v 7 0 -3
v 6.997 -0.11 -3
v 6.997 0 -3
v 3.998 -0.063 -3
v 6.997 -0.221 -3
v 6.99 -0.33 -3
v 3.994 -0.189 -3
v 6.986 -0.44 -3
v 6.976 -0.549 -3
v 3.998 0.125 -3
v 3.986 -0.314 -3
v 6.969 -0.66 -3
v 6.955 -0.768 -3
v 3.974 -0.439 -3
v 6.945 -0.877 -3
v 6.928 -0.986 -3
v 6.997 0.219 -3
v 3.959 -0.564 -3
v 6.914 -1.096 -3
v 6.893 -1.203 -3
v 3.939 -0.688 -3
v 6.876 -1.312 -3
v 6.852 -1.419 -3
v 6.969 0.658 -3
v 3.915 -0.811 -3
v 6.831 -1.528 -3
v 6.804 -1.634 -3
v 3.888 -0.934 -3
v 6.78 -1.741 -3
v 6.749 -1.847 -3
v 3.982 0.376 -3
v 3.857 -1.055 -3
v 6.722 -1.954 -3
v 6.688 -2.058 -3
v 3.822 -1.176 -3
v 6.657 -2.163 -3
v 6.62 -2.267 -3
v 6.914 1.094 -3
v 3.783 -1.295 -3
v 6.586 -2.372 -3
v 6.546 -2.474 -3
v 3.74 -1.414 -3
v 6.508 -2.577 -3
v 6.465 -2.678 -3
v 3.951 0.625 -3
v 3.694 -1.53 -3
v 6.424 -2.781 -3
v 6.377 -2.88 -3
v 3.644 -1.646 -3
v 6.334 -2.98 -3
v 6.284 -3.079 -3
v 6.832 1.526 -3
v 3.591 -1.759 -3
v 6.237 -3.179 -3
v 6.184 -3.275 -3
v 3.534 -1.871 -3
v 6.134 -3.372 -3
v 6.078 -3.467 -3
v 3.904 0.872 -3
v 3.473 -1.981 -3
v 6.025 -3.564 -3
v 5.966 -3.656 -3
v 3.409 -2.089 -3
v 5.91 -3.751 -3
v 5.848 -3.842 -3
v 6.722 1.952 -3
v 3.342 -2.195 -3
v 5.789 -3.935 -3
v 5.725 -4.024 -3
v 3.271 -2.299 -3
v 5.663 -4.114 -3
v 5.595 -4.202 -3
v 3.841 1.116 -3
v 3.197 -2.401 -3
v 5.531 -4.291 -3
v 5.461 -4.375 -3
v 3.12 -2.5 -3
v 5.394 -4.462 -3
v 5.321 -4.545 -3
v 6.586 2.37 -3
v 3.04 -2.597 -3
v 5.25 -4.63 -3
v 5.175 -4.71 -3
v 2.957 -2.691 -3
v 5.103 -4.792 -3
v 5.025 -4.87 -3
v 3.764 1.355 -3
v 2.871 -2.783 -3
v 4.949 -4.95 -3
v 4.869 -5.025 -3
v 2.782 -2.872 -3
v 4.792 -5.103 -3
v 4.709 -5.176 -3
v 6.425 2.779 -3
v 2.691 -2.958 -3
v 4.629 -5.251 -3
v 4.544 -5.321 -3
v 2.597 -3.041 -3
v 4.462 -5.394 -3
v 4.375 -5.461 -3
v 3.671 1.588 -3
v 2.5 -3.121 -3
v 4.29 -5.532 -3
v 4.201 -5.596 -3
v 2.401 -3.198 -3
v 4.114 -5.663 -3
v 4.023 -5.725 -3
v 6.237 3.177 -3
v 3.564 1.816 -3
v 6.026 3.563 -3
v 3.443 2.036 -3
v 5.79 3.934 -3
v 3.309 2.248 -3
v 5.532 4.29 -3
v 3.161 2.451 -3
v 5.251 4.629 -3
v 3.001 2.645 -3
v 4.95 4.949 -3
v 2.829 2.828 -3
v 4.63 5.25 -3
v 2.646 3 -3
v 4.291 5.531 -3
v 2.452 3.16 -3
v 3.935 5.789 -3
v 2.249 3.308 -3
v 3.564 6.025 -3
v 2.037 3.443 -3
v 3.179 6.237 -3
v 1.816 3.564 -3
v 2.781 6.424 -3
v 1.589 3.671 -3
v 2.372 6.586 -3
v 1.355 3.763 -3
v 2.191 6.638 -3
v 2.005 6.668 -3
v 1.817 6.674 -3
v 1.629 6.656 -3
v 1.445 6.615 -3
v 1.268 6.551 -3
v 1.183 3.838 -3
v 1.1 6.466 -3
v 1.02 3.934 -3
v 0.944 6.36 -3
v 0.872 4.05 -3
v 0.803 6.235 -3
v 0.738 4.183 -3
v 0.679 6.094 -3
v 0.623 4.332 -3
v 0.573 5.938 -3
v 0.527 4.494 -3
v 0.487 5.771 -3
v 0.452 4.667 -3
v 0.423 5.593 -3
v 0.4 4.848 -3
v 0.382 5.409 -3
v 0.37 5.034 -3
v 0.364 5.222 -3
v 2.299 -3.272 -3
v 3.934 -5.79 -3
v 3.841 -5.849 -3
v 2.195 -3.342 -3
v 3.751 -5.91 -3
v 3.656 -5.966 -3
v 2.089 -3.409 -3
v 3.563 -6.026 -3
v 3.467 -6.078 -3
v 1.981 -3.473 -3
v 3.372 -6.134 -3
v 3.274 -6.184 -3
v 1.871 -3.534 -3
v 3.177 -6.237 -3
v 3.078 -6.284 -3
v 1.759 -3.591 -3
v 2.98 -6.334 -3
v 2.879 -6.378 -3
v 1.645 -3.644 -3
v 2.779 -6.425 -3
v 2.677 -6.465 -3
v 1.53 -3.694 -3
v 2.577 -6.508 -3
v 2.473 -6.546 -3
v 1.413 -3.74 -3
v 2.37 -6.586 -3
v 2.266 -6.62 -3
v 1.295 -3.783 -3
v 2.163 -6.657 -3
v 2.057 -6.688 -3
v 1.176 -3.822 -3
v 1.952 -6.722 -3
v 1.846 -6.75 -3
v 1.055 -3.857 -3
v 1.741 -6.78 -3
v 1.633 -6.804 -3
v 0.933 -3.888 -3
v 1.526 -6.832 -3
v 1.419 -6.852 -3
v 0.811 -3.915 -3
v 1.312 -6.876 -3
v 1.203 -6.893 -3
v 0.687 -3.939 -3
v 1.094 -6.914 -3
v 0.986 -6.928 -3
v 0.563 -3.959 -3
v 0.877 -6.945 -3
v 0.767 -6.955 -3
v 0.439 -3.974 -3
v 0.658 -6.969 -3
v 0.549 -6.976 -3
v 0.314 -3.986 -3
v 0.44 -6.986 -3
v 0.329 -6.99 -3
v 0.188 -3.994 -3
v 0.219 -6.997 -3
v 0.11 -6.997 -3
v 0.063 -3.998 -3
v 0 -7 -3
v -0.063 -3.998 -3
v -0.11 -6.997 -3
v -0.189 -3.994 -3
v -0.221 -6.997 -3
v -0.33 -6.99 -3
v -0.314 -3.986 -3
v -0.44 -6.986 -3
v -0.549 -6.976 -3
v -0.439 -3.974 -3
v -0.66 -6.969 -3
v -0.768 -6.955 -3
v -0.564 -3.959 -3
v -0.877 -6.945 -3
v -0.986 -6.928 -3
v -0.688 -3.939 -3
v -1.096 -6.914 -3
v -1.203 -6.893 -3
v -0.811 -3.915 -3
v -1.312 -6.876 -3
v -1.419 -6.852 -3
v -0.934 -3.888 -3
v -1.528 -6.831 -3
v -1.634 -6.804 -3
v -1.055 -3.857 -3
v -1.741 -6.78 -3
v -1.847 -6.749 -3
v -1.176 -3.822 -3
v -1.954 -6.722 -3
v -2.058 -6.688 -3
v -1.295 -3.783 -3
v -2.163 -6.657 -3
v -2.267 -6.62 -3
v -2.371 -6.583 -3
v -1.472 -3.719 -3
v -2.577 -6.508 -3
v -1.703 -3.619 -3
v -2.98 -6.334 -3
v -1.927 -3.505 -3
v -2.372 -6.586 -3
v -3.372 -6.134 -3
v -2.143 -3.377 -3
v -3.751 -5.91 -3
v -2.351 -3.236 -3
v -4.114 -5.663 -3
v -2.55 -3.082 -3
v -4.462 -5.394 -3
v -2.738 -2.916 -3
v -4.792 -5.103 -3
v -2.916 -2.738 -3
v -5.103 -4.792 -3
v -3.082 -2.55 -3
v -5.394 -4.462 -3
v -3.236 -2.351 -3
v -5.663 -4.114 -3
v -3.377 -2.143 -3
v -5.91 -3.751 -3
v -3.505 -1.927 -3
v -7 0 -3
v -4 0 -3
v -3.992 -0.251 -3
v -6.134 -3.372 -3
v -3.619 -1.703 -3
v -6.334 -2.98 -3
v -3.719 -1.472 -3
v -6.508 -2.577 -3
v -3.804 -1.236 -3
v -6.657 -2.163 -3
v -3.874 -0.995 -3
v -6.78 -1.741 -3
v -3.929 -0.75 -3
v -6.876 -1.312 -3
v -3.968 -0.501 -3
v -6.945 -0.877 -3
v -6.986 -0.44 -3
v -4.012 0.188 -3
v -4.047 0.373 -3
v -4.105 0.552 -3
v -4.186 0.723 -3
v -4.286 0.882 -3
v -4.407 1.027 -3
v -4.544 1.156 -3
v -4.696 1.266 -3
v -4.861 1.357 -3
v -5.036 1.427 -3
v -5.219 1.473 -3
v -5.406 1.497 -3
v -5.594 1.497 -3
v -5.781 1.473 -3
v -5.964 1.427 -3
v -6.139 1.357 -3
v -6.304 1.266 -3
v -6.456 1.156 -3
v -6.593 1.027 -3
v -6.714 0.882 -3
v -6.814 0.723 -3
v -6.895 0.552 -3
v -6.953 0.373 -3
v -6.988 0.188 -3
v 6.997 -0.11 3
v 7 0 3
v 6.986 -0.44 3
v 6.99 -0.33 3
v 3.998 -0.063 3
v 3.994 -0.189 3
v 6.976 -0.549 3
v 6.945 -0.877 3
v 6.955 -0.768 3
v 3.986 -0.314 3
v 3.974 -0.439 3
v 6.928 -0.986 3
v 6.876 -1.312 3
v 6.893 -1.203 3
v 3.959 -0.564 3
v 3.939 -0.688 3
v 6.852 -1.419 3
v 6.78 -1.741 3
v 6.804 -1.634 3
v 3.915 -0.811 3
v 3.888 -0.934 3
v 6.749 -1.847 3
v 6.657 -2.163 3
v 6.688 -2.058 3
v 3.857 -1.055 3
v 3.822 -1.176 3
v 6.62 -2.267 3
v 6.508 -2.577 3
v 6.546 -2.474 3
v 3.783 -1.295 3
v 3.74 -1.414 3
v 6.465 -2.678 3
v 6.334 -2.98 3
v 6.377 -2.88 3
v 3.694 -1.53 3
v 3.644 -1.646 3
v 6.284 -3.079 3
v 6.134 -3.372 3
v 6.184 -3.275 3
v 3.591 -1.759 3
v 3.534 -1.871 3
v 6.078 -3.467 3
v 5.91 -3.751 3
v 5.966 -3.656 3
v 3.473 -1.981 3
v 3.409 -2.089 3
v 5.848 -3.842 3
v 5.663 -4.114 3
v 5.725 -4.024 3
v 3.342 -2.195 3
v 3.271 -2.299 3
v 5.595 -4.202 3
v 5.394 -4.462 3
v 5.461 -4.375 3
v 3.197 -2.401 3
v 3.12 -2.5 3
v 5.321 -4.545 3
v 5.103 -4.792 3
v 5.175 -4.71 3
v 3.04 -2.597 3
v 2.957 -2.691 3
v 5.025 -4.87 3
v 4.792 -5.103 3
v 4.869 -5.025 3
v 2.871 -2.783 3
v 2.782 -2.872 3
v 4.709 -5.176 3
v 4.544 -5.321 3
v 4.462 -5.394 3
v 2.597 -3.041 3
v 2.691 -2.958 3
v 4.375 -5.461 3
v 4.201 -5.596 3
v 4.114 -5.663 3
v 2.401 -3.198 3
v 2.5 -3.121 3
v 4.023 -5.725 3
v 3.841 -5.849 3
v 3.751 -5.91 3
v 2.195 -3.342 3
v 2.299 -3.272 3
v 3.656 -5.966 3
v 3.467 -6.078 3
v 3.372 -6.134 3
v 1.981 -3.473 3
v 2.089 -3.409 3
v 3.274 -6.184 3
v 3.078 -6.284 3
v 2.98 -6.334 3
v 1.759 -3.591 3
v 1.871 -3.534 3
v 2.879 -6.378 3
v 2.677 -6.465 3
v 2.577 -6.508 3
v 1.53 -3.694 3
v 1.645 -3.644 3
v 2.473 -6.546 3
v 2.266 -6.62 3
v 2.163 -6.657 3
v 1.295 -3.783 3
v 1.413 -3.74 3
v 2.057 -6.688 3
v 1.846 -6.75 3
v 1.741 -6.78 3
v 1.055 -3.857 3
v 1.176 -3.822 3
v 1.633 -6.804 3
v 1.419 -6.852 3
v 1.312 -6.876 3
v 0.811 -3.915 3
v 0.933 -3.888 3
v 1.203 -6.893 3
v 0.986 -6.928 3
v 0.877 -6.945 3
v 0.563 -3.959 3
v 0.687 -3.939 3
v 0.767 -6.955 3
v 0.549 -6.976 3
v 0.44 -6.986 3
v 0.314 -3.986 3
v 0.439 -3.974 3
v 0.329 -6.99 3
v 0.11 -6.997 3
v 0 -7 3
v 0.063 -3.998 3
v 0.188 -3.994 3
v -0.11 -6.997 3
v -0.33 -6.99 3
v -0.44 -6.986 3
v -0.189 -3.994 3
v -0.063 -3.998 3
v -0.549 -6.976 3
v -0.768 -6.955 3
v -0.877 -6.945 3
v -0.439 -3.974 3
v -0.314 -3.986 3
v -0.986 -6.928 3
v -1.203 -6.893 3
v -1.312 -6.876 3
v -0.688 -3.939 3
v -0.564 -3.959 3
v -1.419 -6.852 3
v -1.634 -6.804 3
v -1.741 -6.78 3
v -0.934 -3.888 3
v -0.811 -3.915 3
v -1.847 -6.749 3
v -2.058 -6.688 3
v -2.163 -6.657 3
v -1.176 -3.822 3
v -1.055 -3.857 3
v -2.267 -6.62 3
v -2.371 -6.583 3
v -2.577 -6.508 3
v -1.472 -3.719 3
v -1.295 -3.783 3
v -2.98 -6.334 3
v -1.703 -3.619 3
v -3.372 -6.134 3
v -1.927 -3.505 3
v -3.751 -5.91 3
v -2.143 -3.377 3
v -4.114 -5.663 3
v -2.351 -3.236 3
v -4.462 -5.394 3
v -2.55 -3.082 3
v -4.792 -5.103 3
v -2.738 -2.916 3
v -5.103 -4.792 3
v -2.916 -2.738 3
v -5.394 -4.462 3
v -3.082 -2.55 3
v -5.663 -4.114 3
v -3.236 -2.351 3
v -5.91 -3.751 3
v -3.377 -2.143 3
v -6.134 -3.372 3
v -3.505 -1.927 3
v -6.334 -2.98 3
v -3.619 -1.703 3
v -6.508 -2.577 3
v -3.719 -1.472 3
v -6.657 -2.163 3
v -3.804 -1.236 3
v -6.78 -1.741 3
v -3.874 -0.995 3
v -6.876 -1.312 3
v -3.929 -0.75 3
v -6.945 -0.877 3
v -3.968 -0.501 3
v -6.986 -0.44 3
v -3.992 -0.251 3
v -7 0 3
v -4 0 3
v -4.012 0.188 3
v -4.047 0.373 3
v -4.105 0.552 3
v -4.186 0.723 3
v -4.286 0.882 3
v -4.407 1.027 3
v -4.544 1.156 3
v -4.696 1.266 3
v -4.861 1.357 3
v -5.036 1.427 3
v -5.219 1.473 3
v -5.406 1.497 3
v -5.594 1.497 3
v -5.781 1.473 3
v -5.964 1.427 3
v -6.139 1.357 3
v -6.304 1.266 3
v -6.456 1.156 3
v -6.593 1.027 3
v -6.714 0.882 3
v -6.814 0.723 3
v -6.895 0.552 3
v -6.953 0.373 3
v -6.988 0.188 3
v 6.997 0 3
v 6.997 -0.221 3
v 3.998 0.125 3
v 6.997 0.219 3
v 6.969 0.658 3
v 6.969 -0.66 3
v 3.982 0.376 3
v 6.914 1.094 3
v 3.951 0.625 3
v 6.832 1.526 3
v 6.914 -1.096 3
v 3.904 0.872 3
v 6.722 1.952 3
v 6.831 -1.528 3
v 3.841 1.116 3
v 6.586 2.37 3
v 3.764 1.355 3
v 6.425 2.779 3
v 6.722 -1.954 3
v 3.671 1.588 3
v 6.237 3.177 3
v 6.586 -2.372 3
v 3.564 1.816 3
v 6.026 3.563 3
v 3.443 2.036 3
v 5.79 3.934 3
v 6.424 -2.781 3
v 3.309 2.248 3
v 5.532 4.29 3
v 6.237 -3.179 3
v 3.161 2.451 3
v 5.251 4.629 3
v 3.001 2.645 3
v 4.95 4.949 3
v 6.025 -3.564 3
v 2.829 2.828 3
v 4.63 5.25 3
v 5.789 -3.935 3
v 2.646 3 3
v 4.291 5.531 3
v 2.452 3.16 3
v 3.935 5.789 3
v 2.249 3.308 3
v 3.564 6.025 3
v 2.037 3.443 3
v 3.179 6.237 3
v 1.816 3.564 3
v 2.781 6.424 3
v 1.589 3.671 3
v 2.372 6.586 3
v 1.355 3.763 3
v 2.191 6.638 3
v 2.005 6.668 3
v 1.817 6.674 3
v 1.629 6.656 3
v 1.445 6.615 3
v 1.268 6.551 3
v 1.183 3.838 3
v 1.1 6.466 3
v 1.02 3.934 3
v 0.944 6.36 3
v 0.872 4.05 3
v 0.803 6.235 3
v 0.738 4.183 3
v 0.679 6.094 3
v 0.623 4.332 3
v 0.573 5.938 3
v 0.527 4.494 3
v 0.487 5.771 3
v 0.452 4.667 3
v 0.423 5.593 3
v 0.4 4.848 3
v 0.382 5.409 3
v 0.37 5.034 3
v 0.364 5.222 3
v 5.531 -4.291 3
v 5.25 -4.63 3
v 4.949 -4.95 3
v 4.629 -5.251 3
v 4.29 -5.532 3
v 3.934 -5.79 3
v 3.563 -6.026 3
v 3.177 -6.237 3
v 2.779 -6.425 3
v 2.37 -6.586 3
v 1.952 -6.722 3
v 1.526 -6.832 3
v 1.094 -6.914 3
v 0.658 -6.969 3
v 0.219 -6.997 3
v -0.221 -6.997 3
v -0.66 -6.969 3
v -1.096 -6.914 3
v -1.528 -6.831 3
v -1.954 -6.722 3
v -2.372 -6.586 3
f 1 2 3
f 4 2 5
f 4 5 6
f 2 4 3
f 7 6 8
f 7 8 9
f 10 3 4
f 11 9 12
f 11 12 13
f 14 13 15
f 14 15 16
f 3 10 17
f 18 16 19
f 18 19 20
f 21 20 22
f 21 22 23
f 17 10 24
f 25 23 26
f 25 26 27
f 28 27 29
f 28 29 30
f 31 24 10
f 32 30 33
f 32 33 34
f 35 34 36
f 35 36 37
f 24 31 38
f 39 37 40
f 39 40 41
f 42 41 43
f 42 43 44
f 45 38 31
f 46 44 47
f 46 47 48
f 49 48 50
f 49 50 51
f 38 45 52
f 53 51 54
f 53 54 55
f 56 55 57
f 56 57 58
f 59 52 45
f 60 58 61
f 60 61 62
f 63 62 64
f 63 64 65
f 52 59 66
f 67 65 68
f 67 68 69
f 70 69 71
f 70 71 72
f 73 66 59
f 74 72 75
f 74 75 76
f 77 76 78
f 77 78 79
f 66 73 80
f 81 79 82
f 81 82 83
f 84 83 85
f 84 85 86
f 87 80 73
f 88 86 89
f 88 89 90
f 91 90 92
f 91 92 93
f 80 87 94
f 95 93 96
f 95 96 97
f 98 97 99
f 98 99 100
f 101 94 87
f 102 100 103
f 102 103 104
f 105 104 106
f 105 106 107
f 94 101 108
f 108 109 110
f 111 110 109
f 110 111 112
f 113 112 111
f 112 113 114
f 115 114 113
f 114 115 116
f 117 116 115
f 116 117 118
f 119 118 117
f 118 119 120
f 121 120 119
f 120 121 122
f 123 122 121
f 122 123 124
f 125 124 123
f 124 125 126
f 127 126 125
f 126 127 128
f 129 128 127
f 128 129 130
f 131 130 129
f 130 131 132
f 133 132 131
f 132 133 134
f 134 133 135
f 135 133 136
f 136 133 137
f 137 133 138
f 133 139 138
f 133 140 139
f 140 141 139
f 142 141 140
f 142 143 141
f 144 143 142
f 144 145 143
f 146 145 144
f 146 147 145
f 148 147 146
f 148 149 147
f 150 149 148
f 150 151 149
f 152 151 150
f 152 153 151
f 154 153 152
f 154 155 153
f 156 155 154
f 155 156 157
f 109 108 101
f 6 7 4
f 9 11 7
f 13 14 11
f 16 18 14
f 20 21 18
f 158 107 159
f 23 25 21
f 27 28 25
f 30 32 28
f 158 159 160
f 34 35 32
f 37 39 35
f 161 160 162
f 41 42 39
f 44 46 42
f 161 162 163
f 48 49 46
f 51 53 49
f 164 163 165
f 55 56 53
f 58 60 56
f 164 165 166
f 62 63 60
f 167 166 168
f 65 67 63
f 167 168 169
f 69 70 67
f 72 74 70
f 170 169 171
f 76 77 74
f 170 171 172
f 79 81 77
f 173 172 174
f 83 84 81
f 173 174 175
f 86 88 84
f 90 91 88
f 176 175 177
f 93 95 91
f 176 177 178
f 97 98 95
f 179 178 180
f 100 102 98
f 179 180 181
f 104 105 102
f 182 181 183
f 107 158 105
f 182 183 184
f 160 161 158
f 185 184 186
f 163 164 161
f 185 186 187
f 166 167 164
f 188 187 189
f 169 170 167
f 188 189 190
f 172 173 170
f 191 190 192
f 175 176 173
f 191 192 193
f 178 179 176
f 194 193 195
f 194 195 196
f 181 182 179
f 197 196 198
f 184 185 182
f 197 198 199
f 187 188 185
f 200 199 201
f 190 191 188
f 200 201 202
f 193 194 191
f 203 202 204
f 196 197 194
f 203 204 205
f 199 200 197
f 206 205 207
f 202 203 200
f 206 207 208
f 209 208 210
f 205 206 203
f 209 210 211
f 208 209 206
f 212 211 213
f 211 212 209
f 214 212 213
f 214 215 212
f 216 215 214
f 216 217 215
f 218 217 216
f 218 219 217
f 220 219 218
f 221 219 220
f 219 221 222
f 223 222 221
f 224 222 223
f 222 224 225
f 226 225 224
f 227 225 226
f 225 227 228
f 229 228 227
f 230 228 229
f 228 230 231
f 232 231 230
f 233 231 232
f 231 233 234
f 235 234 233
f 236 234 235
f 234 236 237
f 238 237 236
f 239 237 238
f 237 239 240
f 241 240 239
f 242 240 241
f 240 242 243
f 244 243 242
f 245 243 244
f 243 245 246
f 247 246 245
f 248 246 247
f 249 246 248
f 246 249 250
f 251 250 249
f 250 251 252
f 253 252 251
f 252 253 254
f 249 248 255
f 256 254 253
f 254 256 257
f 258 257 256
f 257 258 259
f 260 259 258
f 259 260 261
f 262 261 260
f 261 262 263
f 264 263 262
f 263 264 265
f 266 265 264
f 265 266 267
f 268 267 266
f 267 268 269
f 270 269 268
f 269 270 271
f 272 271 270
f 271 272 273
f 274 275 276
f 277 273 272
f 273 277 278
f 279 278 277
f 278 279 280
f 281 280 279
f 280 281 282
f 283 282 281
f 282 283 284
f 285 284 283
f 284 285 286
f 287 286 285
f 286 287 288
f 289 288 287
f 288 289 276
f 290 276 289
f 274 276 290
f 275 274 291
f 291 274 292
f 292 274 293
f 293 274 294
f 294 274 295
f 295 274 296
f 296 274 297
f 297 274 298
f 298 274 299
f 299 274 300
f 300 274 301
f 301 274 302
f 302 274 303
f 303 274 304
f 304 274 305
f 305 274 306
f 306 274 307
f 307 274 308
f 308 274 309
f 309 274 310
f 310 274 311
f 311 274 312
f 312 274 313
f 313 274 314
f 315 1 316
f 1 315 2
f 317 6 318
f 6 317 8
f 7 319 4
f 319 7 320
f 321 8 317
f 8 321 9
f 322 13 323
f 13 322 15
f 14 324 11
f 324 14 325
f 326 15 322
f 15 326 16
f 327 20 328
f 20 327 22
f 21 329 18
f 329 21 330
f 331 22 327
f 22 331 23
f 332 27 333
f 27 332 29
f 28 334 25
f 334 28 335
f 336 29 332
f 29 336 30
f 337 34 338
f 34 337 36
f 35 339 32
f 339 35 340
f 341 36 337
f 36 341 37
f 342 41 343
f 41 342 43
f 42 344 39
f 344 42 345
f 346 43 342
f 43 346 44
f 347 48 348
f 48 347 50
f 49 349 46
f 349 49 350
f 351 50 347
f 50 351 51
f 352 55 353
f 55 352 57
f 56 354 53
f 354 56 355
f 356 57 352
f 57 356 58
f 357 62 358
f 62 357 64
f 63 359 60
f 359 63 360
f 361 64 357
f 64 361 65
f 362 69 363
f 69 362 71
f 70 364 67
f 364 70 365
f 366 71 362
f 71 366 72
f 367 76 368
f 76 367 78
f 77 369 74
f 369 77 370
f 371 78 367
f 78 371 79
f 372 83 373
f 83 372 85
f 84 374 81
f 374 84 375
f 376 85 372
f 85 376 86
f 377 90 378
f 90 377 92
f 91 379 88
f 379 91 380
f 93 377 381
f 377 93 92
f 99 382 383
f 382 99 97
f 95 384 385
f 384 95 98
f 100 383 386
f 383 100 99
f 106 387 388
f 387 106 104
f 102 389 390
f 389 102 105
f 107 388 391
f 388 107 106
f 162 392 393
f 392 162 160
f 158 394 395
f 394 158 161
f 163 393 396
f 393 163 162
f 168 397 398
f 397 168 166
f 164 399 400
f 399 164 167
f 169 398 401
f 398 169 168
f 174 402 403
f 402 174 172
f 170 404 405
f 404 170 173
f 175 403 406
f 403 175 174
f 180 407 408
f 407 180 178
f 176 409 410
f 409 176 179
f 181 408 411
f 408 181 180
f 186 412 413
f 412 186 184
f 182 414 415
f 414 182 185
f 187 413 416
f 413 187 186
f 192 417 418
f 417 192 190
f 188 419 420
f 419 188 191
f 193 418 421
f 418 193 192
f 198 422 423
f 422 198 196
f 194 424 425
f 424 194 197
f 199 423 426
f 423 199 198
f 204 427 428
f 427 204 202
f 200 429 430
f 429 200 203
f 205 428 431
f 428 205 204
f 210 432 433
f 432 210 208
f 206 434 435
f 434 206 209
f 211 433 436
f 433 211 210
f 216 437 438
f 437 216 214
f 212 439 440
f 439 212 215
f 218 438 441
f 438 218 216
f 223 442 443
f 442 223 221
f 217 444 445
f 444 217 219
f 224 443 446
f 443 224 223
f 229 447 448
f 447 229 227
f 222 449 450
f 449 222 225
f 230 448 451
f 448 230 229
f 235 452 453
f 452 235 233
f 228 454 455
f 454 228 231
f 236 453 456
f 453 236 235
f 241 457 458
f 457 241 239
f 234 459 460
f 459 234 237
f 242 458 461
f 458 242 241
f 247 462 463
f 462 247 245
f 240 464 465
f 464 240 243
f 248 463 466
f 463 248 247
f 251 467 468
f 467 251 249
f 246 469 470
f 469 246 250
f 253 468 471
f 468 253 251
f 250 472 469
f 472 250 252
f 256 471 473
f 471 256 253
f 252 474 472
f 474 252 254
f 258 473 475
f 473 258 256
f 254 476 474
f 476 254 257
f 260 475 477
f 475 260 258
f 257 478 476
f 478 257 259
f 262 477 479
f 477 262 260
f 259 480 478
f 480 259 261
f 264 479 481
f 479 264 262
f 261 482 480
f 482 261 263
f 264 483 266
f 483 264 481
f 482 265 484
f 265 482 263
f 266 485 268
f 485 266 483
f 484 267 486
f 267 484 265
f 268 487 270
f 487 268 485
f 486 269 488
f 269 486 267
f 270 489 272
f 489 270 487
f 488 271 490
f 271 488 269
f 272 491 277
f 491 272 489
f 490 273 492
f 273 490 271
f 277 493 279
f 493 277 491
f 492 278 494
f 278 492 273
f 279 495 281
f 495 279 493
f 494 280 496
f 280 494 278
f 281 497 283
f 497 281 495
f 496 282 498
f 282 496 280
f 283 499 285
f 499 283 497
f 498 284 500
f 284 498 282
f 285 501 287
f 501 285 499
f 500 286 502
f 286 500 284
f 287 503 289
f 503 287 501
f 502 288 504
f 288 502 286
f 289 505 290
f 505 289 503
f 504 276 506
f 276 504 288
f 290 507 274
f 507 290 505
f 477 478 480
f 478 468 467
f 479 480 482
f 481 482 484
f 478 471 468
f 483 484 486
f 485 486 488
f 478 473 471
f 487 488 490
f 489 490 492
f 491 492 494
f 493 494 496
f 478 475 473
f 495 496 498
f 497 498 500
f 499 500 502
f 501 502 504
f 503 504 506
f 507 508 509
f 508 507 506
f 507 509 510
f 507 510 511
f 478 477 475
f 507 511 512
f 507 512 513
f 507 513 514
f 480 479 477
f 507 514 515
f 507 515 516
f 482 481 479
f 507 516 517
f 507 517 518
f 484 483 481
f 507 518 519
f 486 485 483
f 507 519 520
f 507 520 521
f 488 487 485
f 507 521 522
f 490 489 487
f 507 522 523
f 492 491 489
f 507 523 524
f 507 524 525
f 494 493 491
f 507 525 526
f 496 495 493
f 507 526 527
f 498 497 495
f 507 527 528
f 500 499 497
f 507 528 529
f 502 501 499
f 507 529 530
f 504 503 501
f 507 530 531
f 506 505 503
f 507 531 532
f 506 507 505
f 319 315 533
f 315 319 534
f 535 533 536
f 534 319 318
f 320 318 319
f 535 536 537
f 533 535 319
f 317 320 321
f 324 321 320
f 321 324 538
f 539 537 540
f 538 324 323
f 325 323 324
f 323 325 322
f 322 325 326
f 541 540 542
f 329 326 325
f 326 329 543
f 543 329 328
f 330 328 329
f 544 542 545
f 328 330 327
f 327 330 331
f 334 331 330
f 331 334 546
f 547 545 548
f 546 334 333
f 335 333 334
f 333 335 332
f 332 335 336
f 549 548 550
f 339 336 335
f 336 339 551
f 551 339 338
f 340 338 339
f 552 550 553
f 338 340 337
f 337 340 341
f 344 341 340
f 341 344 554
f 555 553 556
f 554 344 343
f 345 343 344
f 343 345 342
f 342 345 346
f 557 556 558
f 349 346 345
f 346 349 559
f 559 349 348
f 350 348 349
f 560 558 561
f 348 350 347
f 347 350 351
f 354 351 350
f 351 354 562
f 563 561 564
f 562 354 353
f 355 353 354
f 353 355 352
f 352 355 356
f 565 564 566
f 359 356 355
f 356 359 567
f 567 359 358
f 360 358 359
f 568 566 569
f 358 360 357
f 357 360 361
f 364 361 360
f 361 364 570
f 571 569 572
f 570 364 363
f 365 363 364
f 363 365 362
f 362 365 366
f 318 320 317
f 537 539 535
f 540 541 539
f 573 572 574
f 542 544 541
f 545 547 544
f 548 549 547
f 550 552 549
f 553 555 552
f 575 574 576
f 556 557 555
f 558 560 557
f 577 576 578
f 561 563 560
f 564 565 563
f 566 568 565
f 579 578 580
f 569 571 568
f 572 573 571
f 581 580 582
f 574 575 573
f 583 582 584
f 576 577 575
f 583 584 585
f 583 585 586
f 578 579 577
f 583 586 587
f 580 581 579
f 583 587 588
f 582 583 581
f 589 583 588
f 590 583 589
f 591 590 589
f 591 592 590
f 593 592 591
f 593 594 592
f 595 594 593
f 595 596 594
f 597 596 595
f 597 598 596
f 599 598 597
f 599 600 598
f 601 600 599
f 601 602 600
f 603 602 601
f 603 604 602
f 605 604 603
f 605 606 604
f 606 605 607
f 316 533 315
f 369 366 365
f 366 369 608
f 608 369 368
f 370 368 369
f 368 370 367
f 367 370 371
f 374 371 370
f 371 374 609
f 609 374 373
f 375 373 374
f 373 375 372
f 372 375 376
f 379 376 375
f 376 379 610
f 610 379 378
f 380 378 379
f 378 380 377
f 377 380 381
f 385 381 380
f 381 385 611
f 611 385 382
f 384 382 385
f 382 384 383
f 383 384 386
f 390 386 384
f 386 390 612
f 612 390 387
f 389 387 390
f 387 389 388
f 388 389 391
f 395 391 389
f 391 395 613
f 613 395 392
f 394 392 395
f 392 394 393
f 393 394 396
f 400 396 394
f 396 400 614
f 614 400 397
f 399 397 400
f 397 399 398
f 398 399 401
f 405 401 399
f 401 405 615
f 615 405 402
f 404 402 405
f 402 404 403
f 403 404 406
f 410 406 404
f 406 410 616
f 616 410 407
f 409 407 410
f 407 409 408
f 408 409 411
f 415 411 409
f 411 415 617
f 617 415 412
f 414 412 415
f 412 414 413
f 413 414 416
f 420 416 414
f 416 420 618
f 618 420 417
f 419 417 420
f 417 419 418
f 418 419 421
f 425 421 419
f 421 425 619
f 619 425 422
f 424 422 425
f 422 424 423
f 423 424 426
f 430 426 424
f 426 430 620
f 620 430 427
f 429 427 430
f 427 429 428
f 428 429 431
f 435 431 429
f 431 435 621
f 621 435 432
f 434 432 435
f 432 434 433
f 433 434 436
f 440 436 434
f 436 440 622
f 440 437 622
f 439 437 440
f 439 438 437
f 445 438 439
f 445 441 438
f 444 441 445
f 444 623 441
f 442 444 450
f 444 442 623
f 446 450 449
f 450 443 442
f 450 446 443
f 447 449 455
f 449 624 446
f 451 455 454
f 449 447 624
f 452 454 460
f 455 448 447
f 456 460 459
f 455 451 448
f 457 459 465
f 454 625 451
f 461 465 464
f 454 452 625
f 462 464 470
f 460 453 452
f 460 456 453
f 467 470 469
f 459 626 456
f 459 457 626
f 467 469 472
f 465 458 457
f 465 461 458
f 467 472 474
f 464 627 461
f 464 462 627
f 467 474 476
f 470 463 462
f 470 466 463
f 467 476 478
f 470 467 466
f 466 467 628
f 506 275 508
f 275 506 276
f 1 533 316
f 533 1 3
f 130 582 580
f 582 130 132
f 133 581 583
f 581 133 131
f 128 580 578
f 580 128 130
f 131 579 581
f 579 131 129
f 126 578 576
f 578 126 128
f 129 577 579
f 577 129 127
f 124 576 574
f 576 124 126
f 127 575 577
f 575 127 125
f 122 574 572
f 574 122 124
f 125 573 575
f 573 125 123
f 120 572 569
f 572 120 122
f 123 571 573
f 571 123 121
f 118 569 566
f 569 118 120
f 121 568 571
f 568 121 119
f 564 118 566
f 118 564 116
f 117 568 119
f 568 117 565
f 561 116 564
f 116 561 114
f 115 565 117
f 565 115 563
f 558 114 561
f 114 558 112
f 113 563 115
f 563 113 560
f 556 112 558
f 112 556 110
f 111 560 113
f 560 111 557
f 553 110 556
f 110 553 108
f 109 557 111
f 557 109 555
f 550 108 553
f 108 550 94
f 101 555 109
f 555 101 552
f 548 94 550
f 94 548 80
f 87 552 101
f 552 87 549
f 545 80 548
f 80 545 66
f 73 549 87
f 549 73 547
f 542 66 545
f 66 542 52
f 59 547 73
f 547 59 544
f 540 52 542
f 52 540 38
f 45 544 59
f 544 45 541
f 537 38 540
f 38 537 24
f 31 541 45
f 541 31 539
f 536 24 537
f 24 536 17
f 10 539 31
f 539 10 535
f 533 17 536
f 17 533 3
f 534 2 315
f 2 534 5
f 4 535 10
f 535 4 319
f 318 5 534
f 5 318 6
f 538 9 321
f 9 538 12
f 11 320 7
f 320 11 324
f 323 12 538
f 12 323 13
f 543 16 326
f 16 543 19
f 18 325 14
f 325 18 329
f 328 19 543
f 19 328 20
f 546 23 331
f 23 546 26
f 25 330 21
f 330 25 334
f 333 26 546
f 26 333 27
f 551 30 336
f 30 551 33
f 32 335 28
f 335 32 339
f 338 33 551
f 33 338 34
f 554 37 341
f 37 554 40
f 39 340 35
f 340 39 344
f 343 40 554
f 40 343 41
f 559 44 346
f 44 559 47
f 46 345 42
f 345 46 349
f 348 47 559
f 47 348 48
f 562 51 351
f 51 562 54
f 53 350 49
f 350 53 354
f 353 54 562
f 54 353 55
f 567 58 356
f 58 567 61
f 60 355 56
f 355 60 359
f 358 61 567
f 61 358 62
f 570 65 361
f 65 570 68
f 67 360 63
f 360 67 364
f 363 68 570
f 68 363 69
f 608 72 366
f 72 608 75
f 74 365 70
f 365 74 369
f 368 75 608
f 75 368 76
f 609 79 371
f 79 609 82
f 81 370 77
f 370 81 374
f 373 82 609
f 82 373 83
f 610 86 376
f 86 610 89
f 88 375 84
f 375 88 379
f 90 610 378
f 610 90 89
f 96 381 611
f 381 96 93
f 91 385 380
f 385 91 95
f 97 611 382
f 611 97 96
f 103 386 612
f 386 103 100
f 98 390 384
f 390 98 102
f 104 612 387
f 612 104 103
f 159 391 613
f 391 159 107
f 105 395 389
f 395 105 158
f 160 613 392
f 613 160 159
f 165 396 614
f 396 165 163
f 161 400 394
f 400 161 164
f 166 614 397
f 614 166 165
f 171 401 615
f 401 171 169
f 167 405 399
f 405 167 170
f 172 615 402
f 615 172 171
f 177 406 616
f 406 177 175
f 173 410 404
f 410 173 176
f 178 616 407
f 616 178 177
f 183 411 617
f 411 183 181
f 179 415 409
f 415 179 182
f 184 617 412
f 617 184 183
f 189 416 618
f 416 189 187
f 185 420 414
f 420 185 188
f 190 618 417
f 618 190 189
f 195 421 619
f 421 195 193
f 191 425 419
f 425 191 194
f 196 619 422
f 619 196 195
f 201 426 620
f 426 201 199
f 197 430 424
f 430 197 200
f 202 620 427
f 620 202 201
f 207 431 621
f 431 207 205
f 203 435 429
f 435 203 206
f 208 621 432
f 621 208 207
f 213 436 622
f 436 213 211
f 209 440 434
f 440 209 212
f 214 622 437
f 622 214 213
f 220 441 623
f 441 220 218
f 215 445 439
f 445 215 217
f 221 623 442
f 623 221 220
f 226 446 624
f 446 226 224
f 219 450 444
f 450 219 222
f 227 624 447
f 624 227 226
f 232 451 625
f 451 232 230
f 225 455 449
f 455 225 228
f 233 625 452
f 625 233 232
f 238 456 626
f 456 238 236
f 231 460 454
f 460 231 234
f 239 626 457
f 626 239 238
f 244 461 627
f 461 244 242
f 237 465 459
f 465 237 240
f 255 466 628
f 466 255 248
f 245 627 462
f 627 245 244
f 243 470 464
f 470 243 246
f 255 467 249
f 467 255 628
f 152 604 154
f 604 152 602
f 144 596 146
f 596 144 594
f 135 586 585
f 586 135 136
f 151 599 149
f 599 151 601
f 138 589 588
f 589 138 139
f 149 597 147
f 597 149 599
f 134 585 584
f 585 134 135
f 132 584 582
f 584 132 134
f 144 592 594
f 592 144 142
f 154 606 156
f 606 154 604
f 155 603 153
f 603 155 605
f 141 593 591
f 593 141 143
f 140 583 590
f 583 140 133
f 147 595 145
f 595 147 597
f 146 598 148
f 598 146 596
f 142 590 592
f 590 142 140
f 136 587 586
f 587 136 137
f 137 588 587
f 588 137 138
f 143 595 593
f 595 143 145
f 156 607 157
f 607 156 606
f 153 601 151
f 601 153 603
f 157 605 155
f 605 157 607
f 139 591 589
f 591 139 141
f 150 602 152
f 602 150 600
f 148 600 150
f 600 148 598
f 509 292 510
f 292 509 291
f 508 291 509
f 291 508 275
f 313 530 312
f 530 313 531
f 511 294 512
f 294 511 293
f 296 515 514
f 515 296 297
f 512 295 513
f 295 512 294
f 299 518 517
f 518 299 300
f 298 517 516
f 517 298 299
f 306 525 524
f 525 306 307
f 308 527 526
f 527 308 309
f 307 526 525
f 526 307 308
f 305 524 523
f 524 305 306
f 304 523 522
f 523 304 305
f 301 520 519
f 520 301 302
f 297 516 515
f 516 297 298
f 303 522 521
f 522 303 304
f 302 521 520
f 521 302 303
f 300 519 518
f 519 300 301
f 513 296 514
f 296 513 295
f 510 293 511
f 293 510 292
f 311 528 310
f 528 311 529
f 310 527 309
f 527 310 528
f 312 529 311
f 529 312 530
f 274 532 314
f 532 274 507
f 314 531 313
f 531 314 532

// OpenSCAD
$fn = 50;

// How wide should ring be?
width = 3; // [2:8]
// How thick should ring be?
thick = 6; // [1:20]
// What interior radius?
radius = 4; // [5:10]
// What is the width of the ring appature?
opening = 6; // [5:20]

// find angle of opening
angle_opening = 2*asin((width/(width+2*radius))+(opening/(width+2*radius)));

// basic arc
module basic_arc()
{rotate_extrude(convexity=10, $fn = 100)
translate([width/2+radius,0,0])
square(size=[width, thick], center=true);}

// half arc subtraction shape
module half_arc_subtract()
{translate([0,(width+radius),0])
cube([2*(radius+width),2*(radius+width),thick], center=true);}

// half arc
module half_arc() {
difference (){
basic_arc();
half_arc_subtract();
}}

// ring
module ring_simple() {
half_arc();
rotate([0,0,180-angle_opening])
half_arc();
}

// ring end
module ring_end() {
cylinder(r=width/2,h=thick, center=true);
}

// set ring ends
rotate([0,0,-angle_opening])
translate([-(radius+width/2),0,0])
ring_end();
translate([-(radius+width/2),0,0])
ring_end();

ring_simple();
